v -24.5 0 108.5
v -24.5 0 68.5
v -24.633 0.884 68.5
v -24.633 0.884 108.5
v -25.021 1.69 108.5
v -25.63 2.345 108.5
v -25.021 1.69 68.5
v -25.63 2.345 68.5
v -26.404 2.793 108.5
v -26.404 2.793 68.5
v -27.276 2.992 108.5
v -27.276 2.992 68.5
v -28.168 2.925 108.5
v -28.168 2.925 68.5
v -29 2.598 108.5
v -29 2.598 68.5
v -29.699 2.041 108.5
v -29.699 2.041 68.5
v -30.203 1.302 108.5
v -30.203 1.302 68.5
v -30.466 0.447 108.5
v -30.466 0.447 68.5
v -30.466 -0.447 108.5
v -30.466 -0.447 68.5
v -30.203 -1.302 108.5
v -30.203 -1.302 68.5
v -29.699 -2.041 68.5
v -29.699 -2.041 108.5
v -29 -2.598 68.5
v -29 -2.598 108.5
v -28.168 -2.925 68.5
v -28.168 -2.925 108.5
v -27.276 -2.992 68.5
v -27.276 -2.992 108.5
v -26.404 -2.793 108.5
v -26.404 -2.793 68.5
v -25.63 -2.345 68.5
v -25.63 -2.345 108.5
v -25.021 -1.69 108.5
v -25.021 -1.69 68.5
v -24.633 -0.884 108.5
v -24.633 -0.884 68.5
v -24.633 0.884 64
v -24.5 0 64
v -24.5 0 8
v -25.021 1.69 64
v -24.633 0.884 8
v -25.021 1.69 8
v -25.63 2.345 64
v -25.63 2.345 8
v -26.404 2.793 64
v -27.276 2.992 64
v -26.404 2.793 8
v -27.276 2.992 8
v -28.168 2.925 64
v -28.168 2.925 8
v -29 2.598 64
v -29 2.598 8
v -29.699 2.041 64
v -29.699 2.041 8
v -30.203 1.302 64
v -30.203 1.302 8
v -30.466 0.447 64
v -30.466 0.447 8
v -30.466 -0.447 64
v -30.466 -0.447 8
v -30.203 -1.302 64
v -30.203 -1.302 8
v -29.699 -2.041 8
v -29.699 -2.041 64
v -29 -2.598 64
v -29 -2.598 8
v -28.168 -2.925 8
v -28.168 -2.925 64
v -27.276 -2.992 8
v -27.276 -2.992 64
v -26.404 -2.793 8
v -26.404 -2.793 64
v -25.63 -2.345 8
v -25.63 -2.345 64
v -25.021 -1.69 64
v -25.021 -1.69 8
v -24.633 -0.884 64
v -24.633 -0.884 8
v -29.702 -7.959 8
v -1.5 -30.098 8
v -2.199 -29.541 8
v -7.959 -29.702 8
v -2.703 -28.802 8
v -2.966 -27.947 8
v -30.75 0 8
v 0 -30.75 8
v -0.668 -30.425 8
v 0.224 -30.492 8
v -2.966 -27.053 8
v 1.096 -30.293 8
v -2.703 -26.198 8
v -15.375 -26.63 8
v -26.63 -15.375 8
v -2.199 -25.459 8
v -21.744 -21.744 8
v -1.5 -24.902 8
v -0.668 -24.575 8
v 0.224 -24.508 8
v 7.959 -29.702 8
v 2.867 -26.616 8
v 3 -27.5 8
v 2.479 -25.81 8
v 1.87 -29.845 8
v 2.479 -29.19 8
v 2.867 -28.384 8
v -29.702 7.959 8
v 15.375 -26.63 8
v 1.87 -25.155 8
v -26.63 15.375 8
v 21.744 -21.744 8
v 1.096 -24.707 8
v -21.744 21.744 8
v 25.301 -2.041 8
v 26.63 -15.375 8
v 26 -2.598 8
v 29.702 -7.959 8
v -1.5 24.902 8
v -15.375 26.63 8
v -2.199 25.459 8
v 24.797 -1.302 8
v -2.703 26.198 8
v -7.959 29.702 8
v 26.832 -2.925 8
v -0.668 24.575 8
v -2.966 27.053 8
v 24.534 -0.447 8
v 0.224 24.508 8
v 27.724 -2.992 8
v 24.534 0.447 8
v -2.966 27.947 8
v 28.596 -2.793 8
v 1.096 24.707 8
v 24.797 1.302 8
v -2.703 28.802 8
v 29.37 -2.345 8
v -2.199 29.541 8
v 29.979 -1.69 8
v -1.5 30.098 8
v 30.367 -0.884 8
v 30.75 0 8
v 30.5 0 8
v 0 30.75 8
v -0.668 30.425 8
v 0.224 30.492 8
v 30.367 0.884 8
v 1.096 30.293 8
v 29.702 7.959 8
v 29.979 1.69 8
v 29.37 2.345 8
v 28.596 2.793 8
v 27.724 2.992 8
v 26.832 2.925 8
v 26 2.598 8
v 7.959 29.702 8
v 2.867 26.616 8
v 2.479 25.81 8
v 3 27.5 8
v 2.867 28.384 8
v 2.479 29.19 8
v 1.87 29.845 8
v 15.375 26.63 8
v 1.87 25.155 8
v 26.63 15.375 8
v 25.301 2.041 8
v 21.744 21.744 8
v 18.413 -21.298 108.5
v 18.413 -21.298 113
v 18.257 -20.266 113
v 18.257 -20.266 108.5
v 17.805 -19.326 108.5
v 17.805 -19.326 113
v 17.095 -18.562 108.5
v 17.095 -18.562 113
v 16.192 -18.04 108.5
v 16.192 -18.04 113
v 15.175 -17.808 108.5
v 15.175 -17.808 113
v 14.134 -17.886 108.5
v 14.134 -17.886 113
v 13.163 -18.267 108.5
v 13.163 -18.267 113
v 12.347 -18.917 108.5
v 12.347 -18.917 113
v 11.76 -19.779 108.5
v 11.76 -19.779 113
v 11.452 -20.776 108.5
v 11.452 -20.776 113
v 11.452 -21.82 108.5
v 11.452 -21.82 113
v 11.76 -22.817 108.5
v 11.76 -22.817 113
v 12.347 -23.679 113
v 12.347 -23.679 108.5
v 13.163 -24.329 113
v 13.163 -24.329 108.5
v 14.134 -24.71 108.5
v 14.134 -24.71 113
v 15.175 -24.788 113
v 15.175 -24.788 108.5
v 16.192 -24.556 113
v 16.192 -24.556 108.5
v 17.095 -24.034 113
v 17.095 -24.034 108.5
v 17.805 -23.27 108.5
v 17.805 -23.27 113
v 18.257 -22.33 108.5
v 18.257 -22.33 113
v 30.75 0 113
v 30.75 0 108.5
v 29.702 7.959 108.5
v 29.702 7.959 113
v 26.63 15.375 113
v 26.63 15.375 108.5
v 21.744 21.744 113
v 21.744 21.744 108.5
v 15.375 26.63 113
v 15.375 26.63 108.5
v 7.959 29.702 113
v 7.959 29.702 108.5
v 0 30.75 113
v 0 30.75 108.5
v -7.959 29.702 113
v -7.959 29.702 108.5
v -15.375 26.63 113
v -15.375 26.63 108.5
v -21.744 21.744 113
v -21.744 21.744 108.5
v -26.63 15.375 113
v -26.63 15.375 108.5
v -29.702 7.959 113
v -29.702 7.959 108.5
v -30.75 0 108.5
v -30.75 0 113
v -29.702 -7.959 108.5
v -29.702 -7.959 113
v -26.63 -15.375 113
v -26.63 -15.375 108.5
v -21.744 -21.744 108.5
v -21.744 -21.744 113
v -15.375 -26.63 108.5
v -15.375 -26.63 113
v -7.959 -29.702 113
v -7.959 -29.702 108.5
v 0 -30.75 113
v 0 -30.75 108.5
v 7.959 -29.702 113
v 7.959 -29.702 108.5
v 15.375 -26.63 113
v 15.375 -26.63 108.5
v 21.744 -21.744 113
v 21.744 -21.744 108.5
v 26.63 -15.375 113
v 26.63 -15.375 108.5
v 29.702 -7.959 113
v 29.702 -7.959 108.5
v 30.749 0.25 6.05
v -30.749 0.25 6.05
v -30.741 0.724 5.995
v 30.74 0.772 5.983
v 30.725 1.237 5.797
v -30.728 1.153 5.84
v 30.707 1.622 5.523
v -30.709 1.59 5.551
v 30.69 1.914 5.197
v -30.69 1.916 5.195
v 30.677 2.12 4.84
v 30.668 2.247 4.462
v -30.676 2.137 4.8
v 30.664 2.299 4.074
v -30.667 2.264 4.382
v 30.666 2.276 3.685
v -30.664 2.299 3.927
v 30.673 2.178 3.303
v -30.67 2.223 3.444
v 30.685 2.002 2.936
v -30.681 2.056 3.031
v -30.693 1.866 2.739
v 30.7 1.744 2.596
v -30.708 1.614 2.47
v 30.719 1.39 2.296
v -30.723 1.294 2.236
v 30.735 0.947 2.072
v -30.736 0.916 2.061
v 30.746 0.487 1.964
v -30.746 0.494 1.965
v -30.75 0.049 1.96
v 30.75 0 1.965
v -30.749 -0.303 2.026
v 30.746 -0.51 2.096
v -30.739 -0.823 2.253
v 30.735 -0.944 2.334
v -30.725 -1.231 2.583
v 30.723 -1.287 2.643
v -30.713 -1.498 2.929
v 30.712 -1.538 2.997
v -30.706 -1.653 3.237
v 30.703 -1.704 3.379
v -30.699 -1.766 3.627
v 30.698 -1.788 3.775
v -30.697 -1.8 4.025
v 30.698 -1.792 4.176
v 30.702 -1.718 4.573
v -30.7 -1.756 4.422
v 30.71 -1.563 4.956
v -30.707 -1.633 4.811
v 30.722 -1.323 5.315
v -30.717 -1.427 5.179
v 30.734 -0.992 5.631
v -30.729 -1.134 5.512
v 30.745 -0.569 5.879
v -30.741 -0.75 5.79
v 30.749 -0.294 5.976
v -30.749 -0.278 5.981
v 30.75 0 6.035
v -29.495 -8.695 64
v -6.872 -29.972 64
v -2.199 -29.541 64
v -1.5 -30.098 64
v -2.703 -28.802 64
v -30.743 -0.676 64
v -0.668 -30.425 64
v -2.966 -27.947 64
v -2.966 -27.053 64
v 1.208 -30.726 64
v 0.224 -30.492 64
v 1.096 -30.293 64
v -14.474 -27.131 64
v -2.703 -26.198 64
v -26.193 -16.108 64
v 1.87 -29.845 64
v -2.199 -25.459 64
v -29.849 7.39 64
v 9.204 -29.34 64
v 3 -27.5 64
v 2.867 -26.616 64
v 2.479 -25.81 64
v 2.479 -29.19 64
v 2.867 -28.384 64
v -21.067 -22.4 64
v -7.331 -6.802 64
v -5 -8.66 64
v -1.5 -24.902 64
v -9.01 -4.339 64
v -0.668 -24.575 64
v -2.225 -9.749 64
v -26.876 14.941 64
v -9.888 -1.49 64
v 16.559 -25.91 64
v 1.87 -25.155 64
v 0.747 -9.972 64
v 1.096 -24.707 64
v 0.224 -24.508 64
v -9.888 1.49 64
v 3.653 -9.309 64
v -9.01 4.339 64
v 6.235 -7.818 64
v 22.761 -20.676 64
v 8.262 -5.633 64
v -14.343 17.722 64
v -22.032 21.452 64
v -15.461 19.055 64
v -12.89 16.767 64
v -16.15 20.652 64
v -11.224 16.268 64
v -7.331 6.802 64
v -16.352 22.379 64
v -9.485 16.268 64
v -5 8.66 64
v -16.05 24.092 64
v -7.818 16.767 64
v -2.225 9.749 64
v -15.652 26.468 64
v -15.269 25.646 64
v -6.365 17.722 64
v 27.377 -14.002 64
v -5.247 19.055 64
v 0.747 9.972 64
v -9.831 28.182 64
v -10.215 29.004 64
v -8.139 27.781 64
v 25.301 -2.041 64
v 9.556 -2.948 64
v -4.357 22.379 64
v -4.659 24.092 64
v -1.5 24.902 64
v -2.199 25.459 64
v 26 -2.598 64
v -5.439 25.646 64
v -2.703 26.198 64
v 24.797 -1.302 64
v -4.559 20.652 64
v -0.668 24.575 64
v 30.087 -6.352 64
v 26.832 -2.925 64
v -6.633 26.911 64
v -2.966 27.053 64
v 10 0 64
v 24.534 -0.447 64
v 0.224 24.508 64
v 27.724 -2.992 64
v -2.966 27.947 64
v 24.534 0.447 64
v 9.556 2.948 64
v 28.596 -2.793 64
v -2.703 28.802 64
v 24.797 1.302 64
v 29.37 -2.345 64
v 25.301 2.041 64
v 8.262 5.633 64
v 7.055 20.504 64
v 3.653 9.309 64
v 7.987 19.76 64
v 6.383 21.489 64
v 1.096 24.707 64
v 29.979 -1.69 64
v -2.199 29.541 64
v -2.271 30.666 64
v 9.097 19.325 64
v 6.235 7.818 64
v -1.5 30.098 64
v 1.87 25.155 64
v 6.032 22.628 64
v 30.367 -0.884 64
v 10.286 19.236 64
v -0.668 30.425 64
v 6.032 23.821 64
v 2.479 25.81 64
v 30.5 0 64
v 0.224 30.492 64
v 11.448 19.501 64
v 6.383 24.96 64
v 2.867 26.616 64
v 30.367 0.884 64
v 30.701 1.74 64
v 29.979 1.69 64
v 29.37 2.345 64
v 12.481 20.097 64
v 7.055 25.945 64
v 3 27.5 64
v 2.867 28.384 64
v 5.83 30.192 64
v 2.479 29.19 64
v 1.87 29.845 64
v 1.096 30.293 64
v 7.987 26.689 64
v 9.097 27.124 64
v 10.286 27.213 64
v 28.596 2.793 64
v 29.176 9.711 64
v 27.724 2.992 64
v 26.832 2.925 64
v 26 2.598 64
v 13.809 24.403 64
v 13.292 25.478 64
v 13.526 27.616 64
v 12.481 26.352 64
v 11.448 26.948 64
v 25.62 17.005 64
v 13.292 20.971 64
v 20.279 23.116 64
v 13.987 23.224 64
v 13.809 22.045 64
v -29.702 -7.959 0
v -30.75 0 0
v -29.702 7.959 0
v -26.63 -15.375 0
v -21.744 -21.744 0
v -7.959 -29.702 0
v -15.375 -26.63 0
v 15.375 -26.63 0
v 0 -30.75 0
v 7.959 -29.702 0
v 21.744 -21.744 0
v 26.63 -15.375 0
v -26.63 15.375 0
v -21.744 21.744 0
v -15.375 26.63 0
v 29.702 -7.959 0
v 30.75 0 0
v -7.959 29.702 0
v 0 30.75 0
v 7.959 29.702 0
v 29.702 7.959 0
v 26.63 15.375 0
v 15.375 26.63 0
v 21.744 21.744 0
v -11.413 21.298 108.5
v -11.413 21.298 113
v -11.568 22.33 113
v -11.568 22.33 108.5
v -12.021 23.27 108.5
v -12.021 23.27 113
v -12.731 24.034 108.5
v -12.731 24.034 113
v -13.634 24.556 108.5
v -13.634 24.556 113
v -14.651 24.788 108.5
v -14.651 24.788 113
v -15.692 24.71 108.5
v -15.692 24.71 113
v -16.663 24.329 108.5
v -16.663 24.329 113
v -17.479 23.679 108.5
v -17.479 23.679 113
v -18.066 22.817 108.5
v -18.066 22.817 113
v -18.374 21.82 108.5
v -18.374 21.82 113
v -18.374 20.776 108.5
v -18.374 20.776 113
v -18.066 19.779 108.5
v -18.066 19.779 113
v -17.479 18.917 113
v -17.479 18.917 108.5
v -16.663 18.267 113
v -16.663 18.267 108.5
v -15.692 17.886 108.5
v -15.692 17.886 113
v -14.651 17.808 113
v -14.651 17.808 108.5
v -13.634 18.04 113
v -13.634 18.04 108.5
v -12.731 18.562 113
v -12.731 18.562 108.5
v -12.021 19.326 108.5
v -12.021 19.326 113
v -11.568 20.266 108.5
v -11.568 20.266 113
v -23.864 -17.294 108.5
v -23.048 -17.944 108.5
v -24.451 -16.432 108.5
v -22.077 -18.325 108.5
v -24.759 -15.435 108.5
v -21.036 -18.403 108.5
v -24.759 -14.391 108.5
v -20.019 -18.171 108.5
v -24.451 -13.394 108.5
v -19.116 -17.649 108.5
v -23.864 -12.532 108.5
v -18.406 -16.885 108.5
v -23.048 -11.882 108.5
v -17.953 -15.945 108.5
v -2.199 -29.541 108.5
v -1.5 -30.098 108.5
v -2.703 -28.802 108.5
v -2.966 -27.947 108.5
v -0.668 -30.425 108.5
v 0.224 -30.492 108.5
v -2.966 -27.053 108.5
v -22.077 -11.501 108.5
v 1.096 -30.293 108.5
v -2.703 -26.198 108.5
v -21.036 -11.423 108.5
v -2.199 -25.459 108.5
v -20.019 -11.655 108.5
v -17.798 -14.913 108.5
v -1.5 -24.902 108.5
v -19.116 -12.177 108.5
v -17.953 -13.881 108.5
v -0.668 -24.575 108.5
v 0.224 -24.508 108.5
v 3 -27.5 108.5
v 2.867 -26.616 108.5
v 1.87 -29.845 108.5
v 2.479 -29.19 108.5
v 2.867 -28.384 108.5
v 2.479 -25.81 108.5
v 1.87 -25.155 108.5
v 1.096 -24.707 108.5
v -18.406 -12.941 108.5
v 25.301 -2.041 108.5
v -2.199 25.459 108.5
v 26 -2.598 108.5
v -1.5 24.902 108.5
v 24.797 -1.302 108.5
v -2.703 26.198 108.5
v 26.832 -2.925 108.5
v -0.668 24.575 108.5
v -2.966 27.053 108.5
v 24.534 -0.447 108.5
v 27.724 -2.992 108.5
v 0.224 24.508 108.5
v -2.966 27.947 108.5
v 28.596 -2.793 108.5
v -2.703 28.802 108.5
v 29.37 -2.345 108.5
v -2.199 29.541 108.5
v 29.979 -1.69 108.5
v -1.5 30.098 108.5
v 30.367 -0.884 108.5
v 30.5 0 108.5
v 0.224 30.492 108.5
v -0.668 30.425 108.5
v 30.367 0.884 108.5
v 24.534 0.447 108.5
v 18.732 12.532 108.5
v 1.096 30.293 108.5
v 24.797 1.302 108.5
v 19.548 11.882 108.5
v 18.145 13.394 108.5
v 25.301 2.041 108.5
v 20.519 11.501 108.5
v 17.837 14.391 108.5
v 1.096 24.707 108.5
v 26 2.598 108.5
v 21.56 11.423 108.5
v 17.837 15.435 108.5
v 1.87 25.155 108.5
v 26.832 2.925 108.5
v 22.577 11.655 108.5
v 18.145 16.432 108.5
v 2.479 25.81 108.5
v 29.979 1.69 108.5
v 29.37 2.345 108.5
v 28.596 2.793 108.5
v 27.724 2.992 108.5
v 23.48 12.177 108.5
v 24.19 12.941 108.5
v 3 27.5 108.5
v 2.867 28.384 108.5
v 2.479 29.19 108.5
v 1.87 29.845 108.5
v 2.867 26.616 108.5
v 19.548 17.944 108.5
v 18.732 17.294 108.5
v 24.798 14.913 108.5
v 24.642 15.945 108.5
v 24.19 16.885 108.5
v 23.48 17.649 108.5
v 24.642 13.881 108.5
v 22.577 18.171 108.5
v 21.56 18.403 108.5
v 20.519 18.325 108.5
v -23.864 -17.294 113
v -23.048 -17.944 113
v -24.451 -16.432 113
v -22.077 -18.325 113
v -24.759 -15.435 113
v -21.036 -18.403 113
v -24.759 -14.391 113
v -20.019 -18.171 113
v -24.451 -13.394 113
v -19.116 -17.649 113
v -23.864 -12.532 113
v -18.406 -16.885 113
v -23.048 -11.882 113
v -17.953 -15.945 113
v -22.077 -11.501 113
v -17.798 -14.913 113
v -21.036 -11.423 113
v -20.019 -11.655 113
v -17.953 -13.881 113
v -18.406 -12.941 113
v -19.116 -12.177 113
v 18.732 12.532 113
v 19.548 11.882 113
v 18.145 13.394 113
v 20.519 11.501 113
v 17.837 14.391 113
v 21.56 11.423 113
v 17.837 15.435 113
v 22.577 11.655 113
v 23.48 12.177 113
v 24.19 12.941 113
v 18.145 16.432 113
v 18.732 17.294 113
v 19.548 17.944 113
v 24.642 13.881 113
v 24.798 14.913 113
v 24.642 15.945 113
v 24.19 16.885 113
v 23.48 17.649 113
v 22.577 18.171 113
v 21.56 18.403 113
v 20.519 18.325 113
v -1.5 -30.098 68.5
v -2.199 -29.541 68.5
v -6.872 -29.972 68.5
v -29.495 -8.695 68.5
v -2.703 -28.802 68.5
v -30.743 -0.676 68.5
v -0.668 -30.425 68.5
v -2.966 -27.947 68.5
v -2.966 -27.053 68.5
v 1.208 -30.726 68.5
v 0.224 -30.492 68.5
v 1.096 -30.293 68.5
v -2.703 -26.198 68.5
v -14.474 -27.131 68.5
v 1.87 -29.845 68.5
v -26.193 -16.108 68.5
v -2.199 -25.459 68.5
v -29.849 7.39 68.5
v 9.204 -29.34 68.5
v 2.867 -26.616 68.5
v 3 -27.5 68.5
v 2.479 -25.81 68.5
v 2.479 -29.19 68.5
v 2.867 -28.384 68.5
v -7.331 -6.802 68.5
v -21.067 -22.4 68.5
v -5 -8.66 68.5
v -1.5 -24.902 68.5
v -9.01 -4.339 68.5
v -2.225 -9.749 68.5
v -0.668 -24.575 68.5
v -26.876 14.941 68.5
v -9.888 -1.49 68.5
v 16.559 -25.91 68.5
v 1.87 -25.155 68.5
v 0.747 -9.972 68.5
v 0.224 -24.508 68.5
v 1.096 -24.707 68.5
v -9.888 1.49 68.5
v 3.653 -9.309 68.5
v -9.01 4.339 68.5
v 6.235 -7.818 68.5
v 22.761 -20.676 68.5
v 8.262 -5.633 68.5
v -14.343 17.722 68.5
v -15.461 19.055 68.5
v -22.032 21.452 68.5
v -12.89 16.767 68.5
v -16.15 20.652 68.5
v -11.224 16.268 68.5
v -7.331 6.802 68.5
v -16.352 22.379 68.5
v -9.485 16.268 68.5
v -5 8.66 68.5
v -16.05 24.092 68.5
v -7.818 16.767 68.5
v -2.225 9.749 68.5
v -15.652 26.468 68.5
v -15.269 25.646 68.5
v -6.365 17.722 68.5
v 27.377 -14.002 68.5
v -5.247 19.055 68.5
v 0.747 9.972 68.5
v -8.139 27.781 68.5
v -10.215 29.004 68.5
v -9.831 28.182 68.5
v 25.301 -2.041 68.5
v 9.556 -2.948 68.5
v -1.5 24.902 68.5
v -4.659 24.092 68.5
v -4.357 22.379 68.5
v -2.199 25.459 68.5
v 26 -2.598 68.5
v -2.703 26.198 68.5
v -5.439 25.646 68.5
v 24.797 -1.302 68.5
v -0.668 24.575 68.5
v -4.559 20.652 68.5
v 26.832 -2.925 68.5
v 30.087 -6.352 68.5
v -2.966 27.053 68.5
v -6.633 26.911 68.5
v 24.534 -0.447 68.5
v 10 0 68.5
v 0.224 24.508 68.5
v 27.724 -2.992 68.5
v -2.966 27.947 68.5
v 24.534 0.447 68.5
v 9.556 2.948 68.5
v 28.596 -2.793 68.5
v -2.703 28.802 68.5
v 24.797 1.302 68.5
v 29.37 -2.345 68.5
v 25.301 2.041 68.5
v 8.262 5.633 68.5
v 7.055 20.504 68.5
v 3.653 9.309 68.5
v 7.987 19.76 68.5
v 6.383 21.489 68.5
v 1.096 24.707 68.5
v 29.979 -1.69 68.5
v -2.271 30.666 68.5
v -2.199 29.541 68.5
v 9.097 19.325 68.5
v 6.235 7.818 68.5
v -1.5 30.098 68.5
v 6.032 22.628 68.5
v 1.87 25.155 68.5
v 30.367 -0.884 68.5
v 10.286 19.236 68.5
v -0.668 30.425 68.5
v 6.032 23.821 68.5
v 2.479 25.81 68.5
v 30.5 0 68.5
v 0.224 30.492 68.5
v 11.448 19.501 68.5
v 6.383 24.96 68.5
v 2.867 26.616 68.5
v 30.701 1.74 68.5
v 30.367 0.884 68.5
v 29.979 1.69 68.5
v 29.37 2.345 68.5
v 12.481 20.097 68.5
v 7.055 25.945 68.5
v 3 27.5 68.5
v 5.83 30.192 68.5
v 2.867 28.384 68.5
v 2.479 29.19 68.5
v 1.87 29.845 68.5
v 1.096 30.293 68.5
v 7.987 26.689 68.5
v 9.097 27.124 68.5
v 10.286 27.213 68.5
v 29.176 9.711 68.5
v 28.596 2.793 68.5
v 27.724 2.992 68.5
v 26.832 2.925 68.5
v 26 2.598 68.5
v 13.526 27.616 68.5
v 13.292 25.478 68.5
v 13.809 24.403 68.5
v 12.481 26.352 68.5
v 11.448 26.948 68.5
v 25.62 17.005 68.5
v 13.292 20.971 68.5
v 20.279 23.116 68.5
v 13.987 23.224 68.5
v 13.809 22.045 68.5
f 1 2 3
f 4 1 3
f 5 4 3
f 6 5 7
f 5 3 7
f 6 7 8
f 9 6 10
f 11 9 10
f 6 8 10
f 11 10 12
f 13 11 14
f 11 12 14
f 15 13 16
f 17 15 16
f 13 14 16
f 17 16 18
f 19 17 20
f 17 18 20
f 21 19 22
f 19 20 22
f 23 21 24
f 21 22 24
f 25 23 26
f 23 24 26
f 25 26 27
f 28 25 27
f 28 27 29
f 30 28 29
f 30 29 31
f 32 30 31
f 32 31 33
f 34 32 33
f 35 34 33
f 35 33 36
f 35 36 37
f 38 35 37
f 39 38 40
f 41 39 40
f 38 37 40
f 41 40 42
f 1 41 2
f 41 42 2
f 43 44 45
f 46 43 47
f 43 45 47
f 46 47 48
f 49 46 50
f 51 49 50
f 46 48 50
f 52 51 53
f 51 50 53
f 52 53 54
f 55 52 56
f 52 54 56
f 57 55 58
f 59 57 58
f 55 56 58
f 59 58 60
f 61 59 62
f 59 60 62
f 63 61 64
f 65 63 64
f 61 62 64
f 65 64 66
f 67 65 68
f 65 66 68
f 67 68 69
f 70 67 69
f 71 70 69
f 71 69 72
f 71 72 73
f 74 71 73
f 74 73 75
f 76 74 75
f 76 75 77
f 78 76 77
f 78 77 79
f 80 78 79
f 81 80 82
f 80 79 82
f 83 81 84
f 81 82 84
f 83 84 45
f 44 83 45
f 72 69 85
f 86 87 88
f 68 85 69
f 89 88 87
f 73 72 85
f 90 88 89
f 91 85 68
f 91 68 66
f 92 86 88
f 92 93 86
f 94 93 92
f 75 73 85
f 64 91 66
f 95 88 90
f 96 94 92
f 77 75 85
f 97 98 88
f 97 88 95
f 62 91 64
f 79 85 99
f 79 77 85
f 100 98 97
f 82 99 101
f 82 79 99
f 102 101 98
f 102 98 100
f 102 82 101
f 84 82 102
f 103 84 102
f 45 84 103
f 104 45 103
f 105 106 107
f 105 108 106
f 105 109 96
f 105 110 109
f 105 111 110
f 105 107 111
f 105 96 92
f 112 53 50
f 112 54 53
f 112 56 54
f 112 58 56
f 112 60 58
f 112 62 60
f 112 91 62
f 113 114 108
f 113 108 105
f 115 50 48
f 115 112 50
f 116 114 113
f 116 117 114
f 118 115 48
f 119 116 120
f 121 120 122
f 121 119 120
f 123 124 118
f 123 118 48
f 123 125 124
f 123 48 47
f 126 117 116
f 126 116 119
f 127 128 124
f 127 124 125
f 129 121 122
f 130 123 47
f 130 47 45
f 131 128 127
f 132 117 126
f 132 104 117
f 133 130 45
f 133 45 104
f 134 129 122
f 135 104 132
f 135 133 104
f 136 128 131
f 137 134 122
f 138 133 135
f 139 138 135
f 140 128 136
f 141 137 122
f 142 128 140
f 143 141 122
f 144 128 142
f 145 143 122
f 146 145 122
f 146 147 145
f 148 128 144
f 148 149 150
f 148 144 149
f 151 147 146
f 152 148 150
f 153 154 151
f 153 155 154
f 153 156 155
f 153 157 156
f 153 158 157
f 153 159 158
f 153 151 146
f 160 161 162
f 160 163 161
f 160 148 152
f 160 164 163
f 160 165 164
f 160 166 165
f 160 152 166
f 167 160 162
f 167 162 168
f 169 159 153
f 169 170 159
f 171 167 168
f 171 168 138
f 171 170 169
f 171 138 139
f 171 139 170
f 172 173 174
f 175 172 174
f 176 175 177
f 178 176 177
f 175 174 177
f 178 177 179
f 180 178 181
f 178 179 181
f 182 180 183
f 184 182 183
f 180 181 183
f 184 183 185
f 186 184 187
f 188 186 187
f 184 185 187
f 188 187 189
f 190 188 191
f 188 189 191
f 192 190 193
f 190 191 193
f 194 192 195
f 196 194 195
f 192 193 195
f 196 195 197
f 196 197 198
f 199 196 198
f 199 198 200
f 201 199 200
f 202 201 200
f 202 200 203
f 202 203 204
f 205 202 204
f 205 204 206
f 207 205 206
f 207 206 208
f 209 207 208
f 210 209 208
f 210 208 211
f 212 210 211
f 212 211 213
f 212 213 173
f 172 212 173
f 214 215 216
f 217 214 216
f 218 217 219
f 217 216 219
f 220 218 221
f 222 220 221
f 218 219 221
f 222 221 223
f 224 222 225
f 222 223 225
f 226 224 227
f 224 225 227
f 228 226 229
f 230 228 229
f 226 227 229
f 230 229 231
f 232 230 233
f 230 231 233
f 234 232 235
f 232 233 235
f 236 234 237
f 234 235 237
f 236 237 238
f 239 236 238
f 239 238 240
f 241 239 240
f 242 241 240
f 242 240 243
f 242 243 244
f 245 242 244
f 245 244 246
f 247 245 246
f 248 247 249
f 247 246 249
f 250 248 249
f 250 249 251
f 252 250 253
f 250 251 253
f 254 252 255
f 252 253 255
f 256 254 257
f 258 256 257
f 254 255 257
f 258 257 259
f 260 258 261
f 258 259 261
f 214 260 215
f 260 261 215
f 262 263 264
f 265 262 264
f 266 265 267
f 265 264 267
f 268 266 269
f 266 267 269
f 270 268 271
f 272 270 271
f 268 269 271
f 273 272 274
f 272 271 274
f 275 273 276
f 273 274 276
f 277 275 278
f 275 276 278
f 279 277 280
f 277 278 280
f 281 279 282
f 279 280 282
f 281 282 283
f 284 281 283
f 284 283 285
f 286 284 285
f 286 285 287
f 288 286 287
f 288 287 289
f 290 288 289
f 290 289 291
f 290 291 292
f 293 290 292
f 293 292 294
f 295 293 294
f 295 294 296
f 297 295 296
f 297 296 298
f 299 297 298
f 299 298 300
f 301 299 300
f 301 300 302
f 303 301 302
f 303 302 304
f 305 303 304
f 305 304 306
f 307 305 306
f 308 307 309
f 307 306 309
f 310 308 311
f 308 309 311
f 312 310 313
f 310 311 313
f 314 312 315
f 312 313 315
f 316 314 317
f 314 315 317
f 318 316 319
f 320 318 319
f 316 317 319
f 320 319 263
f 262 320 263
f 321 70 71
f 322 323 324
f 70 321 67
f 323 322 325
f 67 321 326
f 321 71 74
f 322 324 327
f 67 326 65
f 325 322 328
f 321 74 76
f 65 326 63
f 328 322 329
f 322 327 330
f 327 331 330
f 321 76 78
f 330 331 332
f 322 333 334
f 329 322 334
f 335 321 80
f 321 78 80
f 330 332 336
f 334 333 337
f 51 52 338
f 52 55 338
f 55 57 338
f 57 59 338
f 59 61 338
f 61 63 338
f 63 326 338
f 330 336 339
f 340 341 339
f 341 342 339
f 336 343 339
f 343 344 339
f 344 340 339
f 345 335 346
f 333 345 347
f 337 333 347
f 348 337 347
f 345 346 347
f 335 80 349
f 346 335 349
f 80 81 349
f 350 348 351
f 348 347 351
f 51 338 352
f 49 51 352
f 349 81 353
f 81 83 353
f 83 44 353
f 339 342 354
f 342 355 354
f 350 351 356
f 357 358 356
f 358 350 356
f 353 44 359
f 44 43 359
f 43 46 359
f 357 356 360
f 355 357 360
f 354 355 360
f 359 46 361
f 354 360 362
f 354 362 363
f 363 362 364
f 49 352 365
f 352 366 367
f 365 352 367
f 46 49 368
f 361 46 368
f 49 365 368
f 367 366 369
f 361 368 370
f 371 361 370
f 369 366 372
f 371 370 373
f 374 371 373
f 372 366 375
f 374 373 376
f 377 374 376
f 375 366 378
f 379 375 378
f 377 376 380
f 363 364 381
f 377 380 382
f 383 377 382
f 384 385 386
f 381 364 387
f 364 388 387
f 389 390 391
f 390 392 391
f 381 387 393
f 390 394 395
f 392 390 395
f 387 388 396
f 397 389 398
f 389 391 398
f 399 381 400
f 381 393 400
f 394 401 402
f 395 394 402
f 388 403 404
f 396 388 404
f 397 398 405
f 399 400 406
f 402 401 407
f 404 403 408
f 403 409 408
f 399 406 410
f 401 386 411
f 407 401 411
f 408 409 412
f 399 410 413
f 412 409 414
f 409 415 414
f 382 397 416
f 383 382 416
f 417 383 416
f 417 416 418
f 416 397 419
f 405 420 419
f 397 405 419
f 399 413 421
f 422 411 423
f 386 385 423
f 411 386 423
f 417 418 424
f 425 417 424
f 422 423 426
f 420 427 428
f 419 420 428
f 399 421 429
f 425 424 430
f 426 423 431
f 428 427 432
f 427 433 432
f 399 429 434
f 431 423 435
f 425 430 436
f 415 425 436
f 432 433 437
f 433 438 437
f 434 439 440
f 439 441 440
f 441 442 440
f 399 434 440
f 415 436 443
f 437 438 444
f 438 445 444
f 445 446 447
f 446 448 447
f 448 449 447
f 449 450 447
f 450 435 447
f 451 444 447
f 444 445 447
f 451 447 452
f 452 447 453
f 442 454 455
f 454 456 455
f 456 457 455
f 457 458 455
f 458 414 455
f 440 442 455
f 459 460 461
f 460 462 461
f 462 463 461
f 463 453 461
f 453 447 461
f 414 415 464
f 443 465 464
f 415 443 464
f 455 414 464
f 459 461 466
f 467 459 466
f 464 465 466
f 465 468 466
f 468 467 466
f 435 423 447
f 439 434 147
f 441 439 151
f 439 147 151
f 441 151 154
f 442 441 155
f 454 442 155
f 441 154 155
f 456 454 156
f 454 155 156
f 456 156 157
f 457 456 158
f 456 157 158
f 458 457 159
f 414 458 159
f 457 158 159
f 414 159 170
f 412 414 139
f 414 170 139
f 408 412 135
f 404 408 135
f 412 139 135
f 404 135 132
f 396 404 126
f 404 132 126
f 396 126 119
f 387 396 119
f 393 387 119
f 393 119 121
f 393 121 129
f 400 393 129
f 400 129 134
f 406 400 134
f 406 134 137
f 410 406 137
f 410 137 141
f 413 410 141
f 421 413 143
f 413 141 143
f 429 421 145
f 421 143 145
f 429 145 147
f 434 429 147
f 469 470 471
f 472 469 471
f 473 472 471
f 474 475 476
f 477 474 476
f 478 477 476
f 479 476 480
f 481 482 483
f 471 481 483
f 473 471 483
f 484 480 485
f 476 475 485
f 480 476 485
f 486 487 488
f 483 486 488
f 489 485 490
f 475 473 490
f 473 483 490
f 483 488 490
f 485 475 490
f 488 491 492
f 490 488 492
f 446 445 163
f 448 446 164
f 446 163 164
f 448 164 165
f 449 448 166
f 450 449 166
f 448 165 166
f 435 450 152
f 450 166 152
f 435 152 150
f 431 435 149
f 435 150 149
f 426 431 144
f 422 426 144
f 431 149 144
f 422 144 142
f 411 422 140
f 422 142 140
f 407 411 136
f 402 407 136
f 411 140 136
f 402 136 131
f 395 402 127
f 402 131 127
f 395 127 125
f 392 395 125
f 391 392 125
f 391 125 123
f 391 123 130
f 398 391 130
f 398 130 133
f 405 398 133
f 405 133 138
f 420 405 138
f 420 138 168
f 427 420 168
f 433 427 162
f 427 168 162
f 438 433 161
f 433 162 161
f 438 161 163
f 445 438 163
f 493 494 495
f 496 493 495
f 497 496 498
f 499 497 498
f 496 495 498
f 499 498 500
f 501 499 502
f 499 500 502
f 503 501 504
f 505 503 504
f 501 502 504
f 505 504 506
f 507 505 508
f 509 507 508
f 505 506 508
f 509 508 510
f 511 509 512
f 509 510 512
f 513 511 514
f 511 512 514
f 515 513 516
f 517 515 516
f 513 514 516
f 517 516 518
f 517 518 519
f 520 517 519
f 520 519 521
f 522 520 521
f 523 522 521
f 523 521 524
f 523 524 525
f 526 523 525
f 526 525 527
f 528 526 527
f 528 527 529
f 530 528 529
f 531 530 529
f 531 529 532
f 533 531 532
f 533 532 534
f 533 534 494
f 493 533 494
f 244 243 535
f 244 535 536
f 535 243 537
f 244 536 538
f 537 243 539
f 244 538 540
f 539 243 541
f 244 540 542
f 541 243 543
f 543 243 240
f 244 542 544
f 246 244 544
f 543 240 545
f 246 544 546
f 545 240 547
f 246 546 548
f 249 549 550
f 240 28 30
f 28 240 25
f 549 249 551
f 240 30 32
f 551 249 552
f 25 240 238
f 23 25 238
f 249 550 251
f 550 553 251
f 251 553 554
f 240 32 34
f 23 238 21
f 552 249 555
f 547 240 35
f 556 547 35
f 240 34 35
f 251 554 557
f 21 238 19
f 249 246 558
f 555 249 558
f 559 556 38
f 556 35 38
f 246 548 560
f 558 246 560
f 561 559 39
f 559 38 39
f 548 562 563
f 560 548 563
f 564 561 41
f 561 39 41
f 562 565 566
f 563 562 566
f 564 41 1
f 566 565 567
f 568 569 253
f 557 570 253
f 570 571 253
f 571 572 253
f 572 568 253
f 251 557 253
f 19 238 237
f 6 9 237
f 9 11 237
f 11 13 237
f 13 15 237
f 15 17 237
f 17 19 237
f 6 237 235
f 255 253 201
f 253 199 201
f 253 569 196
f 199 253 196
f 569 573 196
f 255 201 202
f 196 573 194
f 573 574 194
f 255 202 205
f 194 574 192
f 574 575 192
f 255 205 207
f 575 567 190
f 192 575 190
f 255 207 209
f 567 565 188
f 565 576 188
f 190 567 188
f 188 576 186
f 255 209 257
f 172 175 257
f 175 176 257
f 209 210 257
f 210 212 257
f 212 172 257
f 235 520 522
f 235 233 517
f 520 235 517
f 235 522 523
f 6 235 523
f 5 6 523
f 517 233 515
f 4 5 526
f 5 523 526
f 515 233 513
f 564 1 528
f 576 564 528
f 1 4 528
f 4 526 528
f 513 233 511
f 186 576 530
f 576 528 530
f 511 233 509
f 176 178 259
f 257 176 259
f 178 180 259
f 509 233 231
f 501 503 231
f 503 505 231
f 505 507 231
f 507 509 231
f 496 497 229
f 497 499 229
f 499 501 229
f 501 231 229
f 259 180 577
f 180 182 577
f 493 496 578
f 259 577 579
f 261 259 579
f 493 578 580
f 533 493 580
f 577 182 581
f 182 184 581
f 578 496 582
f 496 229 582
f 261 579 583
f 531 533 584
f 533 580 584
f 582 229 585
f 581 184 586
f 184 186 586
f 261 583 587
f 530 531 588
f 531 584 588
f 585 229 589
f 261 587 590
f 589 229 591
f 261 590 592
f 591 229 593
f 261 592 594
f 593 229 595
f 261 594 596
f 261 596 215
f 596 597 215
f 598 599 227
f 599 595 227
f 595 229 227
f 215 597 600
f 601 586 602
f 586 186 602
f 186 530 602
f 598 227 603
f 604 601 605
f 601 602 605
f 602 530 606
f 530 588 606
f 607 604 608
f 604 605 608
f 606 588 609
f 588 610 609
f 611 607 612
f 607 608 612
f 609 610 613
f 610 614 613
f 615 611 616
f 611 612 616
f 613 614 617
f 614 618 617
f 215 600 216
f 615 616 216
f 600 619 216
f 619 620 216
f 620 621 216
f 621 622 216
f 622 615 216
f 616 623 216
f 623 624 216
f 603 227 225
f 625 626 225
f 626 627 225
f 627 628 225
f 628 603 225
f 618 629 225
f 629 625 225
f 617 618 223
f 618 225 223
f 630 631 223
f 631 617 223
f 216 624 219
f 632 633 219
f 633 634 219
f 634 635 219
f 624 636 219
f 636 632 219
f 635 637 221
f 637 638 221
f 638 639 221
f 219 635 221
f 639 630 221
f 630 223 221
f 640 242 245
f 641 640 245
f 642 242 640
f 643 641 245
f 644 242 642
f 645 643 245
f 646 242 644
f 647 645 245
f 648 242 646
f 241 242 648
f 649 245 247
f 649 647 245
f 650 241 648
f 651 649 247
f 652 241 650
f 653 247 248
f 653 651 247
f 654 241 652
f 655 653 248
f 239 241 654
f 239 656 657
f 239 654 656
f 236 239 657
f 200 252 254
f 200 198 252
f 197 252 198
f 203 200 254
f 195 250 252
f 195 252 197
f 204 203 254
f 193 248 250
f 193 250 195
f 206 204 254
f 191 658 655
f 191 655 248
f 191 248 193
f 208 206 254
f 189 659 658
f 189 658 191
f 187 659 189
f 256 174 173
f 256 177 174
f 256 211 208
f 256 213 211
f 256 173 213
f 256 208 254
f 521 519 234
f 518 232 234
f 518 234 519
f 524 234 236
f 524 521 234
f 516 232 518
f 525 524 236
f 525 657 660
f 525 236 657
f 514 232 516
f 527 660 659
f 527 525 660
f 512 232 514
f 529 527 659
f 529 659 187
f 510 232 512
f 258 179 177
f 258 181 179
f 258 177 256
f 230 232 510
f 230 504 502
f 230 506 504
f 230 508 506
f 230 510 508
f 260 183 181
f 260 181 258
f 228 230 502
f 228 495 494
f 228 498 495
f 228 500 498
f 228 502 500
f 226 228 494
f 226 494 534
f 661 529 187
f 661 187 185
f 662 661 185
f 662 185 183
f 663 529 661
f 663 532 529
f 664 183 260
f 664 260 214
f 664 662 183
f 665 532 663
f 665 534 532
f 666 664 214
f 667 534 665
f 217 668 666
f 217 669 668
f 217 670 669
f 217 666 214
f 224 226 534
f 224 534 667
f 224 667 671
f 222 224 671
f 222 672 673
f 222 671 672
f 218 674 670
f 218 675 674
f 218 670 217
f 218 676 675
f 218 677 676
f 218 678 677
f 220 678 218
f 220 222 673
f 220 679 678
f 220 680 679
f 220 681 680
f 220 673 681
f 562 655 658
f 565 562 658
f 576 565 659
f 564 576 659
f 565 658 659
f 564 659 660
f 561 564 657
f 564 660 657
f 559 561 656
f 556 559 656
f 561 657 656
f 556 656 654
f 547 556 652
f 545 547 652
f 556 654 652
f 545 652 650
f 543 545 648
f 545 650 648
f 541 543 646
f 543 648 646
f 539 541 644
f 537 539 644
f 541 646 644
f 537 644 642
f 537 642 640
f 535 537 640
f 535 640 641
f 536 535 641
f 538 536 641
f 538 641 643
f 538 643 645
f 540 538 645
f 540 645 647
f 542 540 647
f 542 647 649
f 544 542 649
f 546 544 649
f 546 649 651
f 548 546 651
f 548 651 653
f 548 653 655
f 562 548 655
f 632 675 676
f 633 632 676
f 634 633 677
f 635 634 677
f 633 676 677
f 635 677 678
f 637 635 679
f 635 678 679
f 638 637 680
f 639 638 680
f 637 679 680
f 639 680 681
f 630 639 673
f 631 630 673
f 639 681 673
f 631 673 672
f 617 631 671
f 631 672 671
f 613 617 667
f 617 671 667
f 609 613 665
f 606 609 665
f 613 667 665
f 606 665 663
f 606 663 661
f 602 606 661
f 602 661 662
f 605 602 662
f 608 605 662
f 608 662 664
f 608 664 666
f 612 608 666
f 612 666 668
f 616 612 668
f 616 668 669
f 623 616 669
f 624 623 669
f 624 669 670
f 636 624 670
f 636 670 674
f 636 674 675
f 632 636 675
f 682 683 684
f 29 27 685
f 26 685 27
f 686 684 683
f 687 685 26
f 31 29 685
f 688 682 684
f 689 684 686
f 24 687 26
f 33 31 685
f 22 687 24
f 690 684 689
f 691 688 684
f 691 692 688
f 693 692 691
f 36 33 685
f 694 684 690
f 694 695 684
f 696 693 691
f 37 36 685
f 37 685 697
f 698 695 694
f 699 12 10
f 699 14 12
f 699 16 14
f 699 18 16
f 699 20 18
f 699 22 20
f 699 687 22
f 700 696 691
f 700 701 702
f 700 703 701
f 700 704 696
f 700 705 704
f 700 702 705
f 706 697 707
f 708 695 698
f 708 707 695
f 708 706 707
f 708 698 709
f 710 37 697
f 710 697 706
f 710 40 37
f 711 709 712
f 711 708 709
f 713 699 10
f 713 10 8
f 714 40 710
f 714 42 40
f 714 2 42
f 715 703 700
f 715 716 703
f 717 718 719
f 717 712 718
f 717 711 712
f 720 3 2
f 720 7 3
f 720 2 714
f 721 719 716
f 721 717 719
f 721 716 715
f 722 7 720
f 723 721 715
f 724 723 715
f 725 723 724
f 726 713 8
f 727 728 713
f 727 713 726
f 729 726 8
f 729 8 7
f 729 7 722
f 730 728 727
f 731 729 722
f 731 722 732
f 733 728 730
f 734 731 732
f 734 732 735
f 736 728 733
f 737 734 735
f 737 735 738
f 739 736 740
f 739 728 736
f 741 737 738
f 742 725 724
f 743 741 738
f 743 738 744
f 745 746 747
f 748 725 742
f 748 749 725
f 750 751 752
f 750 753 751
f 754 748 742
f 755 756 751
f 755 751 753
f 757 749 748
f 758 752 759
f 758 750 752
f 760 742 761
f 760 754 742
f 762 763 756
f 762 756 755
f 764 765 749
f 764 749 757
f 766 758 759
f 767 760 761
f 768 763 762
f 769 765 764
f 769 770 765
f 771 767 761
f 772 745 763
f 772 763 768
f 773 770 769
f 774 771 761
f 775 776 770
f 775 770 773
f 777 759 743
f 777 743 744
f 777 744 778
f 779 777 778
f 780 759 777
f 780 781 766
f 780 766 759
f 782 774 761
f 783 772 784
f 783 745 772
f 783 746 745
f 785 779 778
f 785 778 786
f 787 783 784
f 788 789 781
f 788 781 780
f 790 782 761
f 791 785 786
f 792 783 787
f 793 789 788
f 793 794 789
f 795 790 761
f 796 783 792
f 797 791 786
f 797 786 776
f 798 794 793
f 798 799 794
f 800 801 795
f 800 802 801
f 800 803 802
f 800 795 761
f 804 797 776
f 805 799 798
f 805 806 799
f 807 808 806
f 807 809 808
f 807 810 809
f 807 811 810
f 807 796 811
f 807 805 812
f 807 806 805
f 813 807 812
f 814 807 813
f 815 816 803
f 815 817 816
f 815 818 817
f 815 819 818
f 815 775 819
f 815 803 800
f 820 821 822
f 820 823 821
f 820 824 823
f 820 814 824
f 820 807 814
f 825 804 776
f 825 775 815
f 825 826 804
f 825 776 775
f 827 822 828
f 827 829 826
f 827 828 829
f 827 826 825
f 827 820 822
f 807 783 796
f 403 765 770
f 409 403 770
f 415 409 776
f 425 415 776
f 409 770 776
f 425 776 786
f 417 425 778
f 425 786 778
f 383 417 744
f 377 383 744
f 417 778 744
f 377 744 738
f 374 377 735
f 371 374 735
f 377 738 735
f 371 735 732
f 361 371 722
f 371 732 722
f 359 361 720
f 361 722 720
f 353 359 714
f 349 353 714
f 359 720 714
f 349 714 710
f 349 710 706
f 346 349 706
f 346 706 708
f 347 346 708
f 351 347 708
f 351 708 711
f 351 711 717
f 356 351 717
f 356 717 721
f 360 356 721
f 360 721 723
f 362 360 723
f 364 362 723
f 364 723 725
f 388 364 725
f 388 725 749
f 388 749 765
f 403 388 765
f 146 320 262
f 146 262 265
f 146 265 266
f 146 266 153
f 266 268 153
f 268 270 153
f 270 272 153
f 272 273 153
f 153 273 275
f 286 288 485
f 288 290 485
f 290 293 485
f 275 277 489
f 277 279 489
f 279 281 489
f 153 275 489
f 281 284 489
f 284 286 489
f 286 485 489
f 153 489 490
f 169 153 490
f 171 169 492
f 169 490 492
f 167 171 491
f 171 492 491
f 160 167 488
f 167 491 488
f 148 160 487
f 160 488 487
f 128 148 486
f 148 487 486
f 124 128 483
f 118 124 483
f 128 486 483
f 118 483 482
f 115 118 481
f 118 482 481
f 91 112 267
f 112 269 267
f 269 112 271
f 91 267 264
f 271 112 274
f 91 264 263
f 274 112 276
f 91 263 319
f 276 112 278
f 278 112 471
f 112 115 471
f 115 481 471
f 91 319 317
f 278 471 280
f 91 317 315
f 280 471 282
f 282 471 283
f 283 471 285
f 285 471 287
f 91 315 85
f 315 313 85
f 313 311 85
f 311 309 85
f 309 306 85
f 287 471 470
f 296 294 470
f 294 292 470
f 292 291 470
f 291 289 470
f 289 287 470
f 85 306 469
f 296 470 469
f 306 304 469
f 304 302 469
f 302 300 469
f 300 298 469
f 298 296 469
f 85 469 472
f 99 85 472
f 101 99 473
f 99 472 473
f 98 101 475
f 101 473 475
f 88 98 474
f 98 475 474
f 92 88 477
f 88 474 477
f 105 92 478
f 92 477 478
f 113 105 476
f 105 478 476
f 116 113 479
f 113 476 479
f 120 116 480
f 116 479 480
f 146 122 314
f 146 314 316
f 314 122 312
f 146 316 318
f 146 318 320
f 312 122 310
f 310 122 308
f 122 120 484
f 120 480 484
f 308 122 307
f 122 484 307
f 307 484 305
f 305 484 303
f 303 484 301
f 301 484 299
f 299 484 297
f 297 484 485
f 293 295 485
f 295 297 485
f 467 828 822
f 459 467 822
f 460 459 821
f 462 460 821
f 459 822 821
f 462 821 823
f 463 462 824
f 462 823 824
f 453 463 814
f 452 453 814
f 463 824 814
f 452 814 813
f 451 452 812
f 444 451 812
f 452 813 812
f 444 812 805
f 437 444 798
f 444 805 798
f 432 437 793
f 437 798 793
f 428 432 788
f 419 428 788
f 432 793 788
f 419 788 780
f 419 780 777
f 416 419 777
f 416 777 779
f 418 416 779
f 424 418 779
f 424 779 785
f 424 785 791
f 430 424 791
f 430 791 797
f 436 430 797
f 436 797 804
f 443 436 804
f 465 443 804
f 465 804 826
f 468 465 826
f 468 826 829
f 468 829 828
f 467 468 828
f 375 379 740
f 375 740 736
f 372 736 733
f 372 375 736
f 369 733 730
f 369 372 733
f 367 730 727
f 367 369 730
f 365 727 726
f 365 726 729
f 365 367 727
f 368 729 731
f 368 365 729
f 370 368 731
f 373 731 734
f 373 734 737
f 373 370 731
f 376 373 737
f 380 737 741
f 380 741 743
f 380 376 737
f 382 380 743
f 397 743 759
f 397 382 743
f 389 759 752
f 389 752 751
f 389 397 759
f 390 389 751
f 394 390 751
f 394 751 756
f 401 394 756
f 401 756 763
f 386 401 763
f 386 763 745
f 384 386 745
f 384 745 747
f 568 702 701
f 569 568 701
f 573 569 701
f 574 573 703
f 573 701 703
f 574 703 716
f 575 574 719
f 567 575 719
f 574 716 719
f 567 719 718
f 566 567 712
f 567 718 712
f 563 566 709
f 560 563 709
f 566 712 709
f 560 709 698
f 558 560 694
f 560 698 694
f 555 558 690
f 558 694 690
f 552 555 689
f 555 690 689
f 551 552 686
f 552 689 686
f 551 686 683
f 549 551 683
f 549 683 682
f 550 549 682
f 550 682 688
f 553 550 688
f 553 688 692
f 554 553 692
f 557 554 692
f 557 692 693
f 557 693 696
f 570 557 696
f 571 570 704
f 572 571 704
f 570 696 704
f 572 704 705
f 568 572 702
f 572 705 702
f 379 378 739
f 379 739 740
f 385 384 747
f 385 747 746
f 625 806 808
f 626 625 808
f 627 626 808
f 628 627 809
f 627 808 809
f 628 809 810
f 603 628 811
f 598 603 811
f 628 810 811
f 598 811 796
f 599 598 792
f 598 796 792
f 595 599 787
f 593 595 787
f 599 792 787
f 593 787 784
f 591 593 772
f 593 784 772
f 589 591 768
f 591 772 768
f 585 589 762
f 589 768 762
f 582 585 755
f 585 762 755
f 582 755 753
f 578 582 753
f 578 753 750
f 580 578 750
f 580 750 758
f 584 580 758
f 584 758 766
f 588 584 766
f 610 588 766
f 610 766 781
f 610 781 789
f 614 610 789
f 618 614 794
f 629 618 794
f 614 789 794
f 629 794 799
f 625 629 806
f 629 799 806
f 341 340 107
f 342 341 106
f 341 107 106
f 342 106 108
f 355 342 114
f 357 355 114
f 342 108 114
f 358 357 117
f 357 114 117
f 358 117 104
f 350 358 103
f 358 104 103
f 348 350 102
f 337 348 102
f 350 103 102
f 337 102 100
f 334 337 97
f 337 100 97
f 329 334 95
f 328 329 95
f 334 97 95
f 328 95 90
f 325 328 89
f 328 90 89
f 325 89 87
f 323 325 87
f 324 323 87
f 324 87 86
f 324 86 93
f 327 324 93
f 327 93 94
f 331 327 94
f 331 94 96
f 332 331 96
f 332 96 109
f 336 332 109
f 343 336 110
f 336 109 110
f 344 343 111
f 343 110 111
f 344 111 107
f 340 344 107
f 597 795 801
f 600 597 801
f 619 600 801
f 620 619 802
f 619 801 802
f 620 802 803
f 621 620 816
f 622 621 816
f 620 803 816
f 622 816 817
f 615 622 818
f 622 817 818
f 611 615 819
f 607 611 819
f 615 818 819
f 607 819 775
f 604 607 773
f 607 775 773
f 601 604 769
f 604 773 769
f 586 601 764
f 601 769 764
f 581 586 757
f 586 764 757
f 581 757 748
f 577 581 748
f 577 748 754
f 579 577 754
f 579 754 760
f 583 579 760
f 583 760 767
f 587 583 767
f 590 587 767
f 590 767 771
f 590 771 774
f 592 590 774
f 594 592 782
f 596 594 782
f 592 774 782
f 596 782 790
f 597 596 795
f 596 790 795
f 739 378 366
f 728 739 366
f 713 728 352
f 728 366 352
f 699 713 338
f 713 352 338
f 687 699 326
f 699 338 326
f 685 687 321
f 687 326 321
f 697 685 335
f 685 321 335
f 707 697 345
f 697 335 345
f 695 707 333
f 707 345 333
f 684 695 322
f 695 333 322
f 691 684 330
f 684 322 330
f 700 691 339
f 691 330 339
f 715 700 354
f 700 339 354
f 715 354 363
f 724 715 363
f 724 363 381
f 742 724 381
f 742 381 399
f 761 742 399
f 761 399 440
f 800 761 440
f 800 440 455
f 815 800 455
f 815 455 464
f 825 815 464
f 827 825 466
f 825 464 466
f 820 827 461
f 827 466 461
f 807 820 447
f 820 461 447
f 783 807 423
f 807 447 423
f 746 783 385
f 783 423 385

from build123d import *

# Parameters (mm, degrees)
ESQUISSE1_R             = 30.75
BOSS_EXTRU_1_DEPTH      = 8
ESQUISSE2_R             = 3
BOSS_EXTRU_2_DEPTH      = 56
ESQUISSE4_R             = 30.75
BOSS_EXTRU_4_DEPTH      = 4.5
ESQUISSE6_R             = 3
BOSS_EXTRU_5_DEPTH      = 40
ESQUISSE12_R            = 4
ENL_V_MAT_EXTRU_1_DEPTH = 6
ENL_V_START             = -10
ENL_V_MAT_EXTRU_2_DEPTH = 10
ESQUISSE15_R            = 10
ENL_V_MAT_EXTRU_3_DEPTH = 10
ESQUISSE18_R            = 30.75
BOSS_EXTRU_10_DEPTH     = 4.5
ESQUISSE19_R            = 2.05
ENL_V_MAT_EXTRU_4_DEPTH = 62
ESQUISSE20_R            = 3.5
ENL_V_MAT_EXTRU_5_DEPTH = 10


with BuildPart() as part:
    # Esquisse1 → Boss.-Extru.1 (new body)
    with BuildSketch(Plane.XY):
        Circle(ESQUISSE1_R)
    extrude(amount=BOSS_EXTRU_1_DEPTH)

    # Esquisse2 → Boss.-Extru.2 (add)
    with BuildSketch(Plane.XY.offset(8)):
        with Locations((0, 27.5)):
            Circle(ESQUISSE2_R)
        with Locations((27.5, 0)):
            Circle(ESQUISSE2_R)
        with Locations((-27.5, 0)):
            Circle(ESQUISSE2_R)
        with Locations((0, -27.5)):
            Circle(ESQUISSE2_R)
    extrude(amount=BOSS_EXTRU_2_DEPTH)

    # Esquisse4 → Boss.-Extru.4 (add)
    with BuildSketch(Plane.XY.offset(64)):
        Circle(ESQUISSE4_R)
    extrude(amount=BOSS_EXTRU_4_DEPTH)

    # Esquisse6 → Boss.-Extru.5 (add)
    with BuildSketch(Plane.XY.offset(68.5)):
        with Locations((0, -27.5)):
            Circle(ESQUISSE6_R)
        with Locations((-27.5, 0)):
            Circle(ESQUISSE6_R)
        with Locations((0, 27.5)):
            Circle(ESQUISSE6_R)
        with Locations((27.5, 0)):
            Circle(ESQUISSE6_R)
    extrude(amount=BOSS_EXTRU_5_DEPTH)

    # Esquisse12 → Enlèv. mat.-Extru.1 (cut)
    with BuildSketch(Plane.XY.offset(68.5)):
        with Locations((9.98690327, 23.224420757)):
            Circle(ESQUISSE12_R)
    extrude(amount=-ENL_V_MAT_EXTRU_1_DEPTH, mode=Mode.SUBTRACT)

    # Esquisse13 → Enlèv. mat.-Extru.2 (cut)
    with BuildSketch(Plane.XY.offset(68.5).offset(ENL_V_START)):
        with BuildLine():
            Line((-15.652440464, 26.468162149), (-15.269059678, 25.645999401))
            ThreePointArc((-15.269059678, 25.645999401), (-7.818437842, 16.76669406), (-9.831212956, 28.181708971))
            Line((-9.831212956, 28.181708971), (-10.214593742, 29.003871719))
            ThreePointArc((-10.214593742, 29.003871719), (-12.995511549, 27.868964451), (-15.652440464, 26.468162149))
        make_face()
    extrude(amount=ENL_V_MAT_EXTRU_2_DEPTH, mode=Mode.SUBTRACT)

    # Esquisse15 → Enlèv. mat.-Extru.3 (cut)
    with BuildSketch(Plane.XY.offset(68.5)):
        Circle(ESQUISSE15_R)
    extrude(amount=-ENL_V_MAT_EXTRU_3_DEPTH, mode=Mode.SUBTRACT)

    # Esquisse18 → Boss.-Extru.10 (add)
    with BuildSketch(Plane.XY.offset(108.5)):
        Circle(ESQUISSE18_R)
    extrude(amount=BOSS_EXTRU_10_DEPTH)

    # Esquisse19 → Enlèv. mat.-Extru.4 (cut)
    with BuildSketch(Plane.ZY.offset(30.75)):
        with Locations((4, 0.25)):
            Circle(ESQUISSE19_R)
    extrude(amount=-ENL_V_MAT_EXTRU_4_DEPTH, mode=Mode.SUBTRACT)

    # Esquisse20 → Enlèv. mat.-Extru.5 (cut)
    with BuildSketch(Plane.XY.offset(113)):
        with Locations((21.297953152, 14.912987345)):
            Circle(ESQUISSE20_R)
        with Locations((-14.912987345, 21.297953152)):
            Circle(ESQUISSE20_R)
        with Locations((-21.297953152, -14.912987345)):
            Circle(ESQUISSE20_R)
        with Locations((14.912987345, -21.297953152)):
            Circle(ESQUISSE20_R)
    extrude(amount=-ENL_V_MAT_EXTRU_5_DEPTH, mode=Mode.SUBTRACT)


solid = part.part
